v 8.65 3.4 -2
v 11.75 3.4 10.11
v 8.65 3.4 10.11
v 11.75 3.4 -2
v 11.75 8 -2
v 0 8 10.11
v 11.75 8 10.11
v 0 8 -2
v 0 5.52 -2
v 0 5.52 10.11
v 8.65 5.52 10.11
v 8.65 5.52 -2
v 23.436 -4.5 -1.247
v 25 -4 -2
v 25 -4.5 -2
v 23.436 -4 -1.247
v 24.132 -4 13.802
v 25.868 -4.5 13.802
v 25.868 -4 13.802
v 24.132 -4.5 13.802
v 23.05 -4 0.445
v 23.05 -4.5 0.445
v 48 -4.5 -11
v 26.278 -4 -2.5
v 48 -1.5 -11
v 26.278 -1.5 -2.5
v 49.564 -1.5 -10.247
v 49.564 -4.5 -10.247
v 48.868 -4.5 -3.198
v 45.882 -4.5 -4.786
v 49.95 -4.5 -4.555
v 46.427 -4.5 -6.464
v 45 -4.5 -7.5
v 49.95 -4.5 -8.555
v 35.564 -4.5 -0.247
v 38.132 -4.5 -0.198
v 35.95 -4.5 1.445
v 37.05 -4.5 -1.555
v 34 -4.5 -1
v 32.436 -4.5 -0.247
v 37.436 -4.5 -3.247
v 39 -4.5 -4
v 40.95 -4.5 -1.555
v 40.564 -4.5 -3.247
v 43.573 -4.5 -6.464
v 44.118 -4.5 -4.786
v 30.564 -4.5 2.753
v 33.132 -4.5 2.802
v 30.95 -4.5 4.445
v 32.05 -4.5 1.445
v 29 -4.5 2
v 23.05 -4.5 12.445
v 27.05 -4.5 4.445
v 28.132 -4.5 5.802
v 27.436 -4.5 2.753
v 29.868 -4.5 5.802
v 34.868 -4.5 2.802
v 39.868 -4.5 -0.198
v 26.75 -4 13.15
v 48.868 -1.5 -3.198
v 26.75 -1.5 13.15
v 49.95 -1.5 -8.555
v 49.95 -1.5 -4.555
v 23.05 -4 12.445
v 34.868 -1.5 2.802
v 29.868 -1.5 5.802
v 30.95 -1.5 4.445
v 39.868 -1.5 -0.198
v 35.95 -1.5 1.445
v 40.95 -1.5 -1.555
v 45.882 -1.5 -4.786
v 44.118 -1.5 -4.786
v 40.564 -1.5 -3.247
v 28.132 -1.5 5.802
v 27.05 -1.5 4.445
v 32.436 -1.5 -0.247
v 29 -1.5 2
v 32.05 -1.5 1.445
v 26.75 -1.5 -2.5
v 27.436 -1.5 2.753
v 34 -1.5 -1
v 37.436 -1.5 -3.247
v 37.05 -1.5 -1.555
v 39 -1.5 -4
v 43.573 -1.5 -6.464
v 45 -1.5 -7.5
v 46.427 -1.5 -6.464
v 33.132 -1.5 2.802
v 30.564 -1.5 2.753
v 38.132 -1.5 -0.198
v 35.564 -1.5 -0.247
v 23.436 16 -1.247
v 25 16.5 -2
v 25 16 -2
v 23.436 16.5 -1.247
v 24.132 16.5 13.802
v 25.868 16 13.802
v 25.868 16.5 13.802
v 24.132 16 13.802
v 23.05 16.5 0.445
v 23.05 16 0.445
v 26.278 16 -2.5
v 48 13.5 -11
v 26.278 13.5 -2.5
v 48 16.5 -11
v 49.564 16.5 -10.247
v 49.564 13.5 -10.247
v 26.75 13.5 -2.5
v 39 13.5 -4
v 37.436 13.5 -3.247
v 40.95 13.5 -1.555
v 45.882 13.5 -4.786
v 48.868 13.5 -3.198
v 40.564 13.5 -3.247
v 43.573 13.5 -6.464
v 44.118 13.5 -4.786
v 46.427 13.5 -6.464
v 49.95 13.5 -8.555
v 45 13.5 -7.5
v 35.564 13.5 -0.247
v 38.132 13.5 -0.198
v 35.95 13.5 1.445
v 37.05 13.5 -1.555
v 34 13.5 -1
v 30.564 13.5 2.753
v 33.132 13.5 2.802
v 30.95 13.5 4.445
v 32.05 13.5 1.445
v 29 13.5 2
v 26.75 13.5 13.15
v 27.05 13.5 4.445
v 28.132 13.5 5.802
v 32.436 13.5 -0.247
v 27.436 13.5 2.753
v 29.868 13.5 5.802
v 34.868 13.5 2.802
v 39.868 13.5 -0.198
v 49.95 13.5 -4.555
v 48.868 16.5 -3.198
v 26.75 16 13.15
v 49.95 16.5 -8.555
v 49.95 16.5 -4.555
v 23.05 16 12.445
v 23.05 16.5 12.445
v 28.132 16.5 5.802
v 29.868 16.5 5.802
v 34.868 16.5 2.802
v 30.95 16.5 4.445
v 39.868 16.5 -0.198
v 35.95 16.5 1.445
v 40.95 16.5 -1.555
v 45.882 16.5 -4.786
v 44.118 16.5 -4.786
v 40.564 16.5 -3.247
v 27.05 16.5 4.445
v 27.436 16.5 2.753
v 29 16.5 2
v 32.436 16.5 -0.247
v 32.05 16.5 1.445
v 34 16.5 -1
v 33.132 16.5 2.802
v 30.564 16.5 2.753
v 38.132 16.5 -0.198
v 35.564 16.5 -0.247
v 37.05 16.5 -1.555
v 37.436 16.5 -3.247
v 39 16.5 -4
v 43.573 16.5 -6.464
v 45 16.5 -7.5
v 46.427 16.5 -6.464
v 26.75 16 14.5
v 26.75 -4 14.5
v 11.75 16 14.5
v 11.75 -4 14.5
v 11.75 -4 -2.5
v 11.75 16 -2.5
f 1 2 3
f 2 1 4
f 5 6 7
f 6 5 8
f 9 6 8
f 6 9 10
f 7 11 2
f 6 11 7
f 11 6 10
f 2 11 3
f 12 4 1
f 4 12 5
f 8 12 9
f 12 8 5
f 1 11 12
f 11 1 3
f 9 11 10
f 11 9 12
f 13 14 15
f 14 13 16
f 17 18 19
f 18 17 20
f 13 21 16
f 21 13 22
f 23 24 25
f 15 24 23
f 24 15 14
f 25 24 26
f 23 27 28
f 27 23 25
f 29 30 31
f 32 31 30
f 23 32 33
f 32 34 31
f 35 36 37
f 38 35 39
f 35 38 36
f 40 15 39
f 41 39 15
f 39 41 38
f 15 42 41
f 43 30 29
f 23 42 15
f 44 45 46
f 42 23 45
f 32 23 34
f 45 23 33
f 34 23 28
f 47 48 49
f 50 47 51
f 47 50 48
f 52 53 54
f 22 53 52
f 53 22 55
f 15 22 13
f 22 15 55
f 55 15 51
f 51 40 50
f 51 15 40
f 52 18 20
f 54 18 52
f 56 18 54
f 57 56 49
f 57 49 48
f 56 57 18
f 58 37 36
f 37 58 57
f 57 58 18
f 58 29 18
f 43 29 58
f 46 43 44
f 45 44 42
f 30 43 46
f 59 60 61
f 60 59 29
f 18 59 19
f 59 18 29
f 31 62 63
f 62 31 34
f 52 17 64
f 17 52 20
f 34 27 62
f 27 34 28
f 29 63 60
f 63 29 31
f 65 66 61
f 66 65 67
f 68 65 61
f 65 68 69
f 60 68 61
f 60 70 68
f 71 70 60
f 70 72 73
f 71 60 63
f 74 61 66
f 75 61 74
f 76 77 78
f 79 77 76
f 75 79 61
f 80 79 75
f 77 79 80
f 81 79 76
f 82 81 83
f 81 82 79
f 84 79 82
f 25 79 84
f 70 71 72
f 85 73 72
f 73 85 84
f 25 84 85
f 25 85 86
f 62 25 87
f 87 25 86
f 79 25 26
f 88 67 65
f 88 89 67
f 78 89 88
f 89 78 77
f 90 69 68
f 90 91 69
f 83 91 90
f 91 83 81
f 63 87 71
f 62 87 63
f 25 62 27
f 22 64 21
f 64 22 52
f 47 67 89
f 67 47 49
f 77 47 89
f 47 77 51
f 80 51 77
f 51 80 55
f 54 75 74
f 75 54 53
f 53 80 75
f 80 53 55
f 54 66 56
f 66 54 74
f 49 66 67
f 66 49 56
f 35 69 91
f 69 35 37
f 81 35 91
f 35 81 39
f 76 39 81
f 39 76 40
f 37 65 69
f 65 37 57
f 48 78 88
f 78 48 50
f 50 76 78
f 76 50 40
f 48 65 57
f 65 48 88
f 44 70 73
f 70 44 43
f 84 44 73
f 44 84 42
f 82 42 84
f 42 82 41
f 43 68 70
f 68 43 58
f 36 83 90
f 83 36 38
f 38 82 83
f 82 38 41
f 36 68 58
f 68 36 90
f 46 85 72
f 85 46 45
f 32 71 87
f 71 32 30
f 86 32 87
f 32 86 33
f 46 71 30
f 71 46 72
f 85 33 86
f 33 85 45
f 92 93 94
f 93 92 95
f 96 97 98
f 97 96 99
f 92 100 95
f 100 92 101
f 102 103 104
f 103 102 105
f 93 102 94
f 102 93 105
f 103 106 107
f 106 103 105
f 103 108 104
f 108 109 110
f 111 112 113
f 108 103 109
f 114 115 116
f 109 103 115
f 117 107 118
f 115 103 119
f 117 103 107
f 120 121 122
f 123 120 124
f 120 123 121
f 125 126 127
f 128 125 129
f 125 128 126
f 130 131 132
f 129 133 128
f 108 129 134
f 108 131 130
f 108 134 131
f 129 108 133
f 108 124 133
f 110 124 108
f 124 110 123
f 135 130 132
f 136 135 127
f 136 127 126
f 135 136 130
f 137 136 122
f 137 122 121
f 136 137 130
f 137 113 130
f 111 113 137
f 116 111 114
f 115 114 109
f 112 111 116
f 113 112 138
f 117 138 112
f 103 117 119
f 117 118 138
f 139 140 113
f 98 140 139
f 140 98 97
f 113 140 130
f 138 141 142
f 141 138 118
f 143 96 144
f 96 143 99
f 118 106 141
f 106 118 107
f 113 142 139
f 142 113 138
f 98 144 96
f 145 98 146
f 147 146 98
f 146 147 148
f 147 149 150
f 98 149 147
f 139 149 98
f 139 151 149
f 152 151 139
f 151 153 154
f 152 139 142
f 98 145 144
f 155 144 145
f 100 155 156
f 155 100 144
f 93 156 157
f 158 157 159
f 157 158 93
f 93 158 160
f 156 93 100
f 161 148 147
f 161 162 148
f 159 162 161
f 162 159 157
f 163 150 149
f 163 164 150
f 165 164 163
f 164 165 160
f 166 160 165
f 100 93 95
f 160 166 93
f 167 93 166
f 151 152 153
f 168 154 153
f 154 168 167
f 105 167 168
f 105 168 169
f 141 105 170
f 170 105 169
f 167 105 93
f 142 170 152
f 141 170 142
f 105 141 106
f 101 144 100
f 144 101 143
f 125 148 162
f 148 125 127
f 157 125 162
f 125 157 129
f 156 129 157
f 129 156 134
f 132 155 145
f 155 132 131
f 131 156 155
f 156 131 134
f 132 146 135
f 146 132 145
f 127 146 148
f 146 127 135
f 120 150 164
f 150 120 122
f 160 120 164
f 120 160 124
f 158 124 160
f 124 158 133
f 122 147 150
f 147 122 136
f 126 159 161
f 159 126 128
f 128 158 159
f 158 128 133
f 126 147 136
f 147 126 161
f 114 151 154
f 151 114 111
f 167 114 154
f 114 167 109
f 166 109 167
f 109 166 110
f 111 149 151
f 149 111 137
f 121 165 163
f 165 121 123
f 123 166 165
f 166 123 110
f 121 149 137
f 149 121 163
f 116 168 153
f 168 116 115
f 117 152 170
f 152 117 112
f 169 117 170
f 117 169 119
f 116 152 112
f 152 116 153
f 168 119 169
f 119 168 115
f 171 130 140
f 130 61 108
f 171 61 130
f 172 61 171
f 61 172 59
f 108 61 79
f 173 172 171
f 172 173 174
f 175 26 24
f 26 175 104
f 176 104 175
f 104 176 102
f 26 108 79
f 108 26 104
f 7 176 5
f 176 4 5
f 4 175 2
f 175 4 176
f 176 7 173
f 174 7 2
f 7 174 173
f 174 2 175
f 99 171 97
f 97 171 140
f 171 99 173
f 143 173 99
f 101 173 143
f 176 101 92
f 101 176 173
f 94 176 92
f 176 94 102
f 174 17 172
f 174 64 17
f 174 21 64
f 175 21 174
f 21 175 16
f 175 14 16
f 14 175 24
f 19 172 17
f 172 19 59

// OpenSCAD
module arm(){

difference(){

linear_extrude(height = 3, center = true, convexity = 10, twist = 0)
translate([0, 0, 0])

hull() {
   translate([-4,0,0]) circle(2);
   translate([8,0,0])
   circle(2);
   translate([17,23,0])
   circle(2);
   translate([13,23,0])
   circle(2);
   
 }
translate([4,4,-3])
cylinder(h= 10,r = 2);
translate([7,9,-3])
cylinder(h= 10,r = 2);
translate([10,14,-3])
cylinder(h= 10,r = 2);
translate([14,20,-3])
cylinder(h= 10,r = 1.5);



}
}


module usb(){

difference(){

cube ([11.8,12.11,4.6]);

translate([0,0,2.48])
cube([8.65,12.11,2.12]);

}

}

translate([0,8,-2])
rotate([90,0,0])
usb();

translate([11.75,-4,-2.5])
cube([15,20,17]);

translate([25,-3,8])
rotate([90,90,0])
arm();

translate([25,15,8])
rotate([90,90,0])
arm();
